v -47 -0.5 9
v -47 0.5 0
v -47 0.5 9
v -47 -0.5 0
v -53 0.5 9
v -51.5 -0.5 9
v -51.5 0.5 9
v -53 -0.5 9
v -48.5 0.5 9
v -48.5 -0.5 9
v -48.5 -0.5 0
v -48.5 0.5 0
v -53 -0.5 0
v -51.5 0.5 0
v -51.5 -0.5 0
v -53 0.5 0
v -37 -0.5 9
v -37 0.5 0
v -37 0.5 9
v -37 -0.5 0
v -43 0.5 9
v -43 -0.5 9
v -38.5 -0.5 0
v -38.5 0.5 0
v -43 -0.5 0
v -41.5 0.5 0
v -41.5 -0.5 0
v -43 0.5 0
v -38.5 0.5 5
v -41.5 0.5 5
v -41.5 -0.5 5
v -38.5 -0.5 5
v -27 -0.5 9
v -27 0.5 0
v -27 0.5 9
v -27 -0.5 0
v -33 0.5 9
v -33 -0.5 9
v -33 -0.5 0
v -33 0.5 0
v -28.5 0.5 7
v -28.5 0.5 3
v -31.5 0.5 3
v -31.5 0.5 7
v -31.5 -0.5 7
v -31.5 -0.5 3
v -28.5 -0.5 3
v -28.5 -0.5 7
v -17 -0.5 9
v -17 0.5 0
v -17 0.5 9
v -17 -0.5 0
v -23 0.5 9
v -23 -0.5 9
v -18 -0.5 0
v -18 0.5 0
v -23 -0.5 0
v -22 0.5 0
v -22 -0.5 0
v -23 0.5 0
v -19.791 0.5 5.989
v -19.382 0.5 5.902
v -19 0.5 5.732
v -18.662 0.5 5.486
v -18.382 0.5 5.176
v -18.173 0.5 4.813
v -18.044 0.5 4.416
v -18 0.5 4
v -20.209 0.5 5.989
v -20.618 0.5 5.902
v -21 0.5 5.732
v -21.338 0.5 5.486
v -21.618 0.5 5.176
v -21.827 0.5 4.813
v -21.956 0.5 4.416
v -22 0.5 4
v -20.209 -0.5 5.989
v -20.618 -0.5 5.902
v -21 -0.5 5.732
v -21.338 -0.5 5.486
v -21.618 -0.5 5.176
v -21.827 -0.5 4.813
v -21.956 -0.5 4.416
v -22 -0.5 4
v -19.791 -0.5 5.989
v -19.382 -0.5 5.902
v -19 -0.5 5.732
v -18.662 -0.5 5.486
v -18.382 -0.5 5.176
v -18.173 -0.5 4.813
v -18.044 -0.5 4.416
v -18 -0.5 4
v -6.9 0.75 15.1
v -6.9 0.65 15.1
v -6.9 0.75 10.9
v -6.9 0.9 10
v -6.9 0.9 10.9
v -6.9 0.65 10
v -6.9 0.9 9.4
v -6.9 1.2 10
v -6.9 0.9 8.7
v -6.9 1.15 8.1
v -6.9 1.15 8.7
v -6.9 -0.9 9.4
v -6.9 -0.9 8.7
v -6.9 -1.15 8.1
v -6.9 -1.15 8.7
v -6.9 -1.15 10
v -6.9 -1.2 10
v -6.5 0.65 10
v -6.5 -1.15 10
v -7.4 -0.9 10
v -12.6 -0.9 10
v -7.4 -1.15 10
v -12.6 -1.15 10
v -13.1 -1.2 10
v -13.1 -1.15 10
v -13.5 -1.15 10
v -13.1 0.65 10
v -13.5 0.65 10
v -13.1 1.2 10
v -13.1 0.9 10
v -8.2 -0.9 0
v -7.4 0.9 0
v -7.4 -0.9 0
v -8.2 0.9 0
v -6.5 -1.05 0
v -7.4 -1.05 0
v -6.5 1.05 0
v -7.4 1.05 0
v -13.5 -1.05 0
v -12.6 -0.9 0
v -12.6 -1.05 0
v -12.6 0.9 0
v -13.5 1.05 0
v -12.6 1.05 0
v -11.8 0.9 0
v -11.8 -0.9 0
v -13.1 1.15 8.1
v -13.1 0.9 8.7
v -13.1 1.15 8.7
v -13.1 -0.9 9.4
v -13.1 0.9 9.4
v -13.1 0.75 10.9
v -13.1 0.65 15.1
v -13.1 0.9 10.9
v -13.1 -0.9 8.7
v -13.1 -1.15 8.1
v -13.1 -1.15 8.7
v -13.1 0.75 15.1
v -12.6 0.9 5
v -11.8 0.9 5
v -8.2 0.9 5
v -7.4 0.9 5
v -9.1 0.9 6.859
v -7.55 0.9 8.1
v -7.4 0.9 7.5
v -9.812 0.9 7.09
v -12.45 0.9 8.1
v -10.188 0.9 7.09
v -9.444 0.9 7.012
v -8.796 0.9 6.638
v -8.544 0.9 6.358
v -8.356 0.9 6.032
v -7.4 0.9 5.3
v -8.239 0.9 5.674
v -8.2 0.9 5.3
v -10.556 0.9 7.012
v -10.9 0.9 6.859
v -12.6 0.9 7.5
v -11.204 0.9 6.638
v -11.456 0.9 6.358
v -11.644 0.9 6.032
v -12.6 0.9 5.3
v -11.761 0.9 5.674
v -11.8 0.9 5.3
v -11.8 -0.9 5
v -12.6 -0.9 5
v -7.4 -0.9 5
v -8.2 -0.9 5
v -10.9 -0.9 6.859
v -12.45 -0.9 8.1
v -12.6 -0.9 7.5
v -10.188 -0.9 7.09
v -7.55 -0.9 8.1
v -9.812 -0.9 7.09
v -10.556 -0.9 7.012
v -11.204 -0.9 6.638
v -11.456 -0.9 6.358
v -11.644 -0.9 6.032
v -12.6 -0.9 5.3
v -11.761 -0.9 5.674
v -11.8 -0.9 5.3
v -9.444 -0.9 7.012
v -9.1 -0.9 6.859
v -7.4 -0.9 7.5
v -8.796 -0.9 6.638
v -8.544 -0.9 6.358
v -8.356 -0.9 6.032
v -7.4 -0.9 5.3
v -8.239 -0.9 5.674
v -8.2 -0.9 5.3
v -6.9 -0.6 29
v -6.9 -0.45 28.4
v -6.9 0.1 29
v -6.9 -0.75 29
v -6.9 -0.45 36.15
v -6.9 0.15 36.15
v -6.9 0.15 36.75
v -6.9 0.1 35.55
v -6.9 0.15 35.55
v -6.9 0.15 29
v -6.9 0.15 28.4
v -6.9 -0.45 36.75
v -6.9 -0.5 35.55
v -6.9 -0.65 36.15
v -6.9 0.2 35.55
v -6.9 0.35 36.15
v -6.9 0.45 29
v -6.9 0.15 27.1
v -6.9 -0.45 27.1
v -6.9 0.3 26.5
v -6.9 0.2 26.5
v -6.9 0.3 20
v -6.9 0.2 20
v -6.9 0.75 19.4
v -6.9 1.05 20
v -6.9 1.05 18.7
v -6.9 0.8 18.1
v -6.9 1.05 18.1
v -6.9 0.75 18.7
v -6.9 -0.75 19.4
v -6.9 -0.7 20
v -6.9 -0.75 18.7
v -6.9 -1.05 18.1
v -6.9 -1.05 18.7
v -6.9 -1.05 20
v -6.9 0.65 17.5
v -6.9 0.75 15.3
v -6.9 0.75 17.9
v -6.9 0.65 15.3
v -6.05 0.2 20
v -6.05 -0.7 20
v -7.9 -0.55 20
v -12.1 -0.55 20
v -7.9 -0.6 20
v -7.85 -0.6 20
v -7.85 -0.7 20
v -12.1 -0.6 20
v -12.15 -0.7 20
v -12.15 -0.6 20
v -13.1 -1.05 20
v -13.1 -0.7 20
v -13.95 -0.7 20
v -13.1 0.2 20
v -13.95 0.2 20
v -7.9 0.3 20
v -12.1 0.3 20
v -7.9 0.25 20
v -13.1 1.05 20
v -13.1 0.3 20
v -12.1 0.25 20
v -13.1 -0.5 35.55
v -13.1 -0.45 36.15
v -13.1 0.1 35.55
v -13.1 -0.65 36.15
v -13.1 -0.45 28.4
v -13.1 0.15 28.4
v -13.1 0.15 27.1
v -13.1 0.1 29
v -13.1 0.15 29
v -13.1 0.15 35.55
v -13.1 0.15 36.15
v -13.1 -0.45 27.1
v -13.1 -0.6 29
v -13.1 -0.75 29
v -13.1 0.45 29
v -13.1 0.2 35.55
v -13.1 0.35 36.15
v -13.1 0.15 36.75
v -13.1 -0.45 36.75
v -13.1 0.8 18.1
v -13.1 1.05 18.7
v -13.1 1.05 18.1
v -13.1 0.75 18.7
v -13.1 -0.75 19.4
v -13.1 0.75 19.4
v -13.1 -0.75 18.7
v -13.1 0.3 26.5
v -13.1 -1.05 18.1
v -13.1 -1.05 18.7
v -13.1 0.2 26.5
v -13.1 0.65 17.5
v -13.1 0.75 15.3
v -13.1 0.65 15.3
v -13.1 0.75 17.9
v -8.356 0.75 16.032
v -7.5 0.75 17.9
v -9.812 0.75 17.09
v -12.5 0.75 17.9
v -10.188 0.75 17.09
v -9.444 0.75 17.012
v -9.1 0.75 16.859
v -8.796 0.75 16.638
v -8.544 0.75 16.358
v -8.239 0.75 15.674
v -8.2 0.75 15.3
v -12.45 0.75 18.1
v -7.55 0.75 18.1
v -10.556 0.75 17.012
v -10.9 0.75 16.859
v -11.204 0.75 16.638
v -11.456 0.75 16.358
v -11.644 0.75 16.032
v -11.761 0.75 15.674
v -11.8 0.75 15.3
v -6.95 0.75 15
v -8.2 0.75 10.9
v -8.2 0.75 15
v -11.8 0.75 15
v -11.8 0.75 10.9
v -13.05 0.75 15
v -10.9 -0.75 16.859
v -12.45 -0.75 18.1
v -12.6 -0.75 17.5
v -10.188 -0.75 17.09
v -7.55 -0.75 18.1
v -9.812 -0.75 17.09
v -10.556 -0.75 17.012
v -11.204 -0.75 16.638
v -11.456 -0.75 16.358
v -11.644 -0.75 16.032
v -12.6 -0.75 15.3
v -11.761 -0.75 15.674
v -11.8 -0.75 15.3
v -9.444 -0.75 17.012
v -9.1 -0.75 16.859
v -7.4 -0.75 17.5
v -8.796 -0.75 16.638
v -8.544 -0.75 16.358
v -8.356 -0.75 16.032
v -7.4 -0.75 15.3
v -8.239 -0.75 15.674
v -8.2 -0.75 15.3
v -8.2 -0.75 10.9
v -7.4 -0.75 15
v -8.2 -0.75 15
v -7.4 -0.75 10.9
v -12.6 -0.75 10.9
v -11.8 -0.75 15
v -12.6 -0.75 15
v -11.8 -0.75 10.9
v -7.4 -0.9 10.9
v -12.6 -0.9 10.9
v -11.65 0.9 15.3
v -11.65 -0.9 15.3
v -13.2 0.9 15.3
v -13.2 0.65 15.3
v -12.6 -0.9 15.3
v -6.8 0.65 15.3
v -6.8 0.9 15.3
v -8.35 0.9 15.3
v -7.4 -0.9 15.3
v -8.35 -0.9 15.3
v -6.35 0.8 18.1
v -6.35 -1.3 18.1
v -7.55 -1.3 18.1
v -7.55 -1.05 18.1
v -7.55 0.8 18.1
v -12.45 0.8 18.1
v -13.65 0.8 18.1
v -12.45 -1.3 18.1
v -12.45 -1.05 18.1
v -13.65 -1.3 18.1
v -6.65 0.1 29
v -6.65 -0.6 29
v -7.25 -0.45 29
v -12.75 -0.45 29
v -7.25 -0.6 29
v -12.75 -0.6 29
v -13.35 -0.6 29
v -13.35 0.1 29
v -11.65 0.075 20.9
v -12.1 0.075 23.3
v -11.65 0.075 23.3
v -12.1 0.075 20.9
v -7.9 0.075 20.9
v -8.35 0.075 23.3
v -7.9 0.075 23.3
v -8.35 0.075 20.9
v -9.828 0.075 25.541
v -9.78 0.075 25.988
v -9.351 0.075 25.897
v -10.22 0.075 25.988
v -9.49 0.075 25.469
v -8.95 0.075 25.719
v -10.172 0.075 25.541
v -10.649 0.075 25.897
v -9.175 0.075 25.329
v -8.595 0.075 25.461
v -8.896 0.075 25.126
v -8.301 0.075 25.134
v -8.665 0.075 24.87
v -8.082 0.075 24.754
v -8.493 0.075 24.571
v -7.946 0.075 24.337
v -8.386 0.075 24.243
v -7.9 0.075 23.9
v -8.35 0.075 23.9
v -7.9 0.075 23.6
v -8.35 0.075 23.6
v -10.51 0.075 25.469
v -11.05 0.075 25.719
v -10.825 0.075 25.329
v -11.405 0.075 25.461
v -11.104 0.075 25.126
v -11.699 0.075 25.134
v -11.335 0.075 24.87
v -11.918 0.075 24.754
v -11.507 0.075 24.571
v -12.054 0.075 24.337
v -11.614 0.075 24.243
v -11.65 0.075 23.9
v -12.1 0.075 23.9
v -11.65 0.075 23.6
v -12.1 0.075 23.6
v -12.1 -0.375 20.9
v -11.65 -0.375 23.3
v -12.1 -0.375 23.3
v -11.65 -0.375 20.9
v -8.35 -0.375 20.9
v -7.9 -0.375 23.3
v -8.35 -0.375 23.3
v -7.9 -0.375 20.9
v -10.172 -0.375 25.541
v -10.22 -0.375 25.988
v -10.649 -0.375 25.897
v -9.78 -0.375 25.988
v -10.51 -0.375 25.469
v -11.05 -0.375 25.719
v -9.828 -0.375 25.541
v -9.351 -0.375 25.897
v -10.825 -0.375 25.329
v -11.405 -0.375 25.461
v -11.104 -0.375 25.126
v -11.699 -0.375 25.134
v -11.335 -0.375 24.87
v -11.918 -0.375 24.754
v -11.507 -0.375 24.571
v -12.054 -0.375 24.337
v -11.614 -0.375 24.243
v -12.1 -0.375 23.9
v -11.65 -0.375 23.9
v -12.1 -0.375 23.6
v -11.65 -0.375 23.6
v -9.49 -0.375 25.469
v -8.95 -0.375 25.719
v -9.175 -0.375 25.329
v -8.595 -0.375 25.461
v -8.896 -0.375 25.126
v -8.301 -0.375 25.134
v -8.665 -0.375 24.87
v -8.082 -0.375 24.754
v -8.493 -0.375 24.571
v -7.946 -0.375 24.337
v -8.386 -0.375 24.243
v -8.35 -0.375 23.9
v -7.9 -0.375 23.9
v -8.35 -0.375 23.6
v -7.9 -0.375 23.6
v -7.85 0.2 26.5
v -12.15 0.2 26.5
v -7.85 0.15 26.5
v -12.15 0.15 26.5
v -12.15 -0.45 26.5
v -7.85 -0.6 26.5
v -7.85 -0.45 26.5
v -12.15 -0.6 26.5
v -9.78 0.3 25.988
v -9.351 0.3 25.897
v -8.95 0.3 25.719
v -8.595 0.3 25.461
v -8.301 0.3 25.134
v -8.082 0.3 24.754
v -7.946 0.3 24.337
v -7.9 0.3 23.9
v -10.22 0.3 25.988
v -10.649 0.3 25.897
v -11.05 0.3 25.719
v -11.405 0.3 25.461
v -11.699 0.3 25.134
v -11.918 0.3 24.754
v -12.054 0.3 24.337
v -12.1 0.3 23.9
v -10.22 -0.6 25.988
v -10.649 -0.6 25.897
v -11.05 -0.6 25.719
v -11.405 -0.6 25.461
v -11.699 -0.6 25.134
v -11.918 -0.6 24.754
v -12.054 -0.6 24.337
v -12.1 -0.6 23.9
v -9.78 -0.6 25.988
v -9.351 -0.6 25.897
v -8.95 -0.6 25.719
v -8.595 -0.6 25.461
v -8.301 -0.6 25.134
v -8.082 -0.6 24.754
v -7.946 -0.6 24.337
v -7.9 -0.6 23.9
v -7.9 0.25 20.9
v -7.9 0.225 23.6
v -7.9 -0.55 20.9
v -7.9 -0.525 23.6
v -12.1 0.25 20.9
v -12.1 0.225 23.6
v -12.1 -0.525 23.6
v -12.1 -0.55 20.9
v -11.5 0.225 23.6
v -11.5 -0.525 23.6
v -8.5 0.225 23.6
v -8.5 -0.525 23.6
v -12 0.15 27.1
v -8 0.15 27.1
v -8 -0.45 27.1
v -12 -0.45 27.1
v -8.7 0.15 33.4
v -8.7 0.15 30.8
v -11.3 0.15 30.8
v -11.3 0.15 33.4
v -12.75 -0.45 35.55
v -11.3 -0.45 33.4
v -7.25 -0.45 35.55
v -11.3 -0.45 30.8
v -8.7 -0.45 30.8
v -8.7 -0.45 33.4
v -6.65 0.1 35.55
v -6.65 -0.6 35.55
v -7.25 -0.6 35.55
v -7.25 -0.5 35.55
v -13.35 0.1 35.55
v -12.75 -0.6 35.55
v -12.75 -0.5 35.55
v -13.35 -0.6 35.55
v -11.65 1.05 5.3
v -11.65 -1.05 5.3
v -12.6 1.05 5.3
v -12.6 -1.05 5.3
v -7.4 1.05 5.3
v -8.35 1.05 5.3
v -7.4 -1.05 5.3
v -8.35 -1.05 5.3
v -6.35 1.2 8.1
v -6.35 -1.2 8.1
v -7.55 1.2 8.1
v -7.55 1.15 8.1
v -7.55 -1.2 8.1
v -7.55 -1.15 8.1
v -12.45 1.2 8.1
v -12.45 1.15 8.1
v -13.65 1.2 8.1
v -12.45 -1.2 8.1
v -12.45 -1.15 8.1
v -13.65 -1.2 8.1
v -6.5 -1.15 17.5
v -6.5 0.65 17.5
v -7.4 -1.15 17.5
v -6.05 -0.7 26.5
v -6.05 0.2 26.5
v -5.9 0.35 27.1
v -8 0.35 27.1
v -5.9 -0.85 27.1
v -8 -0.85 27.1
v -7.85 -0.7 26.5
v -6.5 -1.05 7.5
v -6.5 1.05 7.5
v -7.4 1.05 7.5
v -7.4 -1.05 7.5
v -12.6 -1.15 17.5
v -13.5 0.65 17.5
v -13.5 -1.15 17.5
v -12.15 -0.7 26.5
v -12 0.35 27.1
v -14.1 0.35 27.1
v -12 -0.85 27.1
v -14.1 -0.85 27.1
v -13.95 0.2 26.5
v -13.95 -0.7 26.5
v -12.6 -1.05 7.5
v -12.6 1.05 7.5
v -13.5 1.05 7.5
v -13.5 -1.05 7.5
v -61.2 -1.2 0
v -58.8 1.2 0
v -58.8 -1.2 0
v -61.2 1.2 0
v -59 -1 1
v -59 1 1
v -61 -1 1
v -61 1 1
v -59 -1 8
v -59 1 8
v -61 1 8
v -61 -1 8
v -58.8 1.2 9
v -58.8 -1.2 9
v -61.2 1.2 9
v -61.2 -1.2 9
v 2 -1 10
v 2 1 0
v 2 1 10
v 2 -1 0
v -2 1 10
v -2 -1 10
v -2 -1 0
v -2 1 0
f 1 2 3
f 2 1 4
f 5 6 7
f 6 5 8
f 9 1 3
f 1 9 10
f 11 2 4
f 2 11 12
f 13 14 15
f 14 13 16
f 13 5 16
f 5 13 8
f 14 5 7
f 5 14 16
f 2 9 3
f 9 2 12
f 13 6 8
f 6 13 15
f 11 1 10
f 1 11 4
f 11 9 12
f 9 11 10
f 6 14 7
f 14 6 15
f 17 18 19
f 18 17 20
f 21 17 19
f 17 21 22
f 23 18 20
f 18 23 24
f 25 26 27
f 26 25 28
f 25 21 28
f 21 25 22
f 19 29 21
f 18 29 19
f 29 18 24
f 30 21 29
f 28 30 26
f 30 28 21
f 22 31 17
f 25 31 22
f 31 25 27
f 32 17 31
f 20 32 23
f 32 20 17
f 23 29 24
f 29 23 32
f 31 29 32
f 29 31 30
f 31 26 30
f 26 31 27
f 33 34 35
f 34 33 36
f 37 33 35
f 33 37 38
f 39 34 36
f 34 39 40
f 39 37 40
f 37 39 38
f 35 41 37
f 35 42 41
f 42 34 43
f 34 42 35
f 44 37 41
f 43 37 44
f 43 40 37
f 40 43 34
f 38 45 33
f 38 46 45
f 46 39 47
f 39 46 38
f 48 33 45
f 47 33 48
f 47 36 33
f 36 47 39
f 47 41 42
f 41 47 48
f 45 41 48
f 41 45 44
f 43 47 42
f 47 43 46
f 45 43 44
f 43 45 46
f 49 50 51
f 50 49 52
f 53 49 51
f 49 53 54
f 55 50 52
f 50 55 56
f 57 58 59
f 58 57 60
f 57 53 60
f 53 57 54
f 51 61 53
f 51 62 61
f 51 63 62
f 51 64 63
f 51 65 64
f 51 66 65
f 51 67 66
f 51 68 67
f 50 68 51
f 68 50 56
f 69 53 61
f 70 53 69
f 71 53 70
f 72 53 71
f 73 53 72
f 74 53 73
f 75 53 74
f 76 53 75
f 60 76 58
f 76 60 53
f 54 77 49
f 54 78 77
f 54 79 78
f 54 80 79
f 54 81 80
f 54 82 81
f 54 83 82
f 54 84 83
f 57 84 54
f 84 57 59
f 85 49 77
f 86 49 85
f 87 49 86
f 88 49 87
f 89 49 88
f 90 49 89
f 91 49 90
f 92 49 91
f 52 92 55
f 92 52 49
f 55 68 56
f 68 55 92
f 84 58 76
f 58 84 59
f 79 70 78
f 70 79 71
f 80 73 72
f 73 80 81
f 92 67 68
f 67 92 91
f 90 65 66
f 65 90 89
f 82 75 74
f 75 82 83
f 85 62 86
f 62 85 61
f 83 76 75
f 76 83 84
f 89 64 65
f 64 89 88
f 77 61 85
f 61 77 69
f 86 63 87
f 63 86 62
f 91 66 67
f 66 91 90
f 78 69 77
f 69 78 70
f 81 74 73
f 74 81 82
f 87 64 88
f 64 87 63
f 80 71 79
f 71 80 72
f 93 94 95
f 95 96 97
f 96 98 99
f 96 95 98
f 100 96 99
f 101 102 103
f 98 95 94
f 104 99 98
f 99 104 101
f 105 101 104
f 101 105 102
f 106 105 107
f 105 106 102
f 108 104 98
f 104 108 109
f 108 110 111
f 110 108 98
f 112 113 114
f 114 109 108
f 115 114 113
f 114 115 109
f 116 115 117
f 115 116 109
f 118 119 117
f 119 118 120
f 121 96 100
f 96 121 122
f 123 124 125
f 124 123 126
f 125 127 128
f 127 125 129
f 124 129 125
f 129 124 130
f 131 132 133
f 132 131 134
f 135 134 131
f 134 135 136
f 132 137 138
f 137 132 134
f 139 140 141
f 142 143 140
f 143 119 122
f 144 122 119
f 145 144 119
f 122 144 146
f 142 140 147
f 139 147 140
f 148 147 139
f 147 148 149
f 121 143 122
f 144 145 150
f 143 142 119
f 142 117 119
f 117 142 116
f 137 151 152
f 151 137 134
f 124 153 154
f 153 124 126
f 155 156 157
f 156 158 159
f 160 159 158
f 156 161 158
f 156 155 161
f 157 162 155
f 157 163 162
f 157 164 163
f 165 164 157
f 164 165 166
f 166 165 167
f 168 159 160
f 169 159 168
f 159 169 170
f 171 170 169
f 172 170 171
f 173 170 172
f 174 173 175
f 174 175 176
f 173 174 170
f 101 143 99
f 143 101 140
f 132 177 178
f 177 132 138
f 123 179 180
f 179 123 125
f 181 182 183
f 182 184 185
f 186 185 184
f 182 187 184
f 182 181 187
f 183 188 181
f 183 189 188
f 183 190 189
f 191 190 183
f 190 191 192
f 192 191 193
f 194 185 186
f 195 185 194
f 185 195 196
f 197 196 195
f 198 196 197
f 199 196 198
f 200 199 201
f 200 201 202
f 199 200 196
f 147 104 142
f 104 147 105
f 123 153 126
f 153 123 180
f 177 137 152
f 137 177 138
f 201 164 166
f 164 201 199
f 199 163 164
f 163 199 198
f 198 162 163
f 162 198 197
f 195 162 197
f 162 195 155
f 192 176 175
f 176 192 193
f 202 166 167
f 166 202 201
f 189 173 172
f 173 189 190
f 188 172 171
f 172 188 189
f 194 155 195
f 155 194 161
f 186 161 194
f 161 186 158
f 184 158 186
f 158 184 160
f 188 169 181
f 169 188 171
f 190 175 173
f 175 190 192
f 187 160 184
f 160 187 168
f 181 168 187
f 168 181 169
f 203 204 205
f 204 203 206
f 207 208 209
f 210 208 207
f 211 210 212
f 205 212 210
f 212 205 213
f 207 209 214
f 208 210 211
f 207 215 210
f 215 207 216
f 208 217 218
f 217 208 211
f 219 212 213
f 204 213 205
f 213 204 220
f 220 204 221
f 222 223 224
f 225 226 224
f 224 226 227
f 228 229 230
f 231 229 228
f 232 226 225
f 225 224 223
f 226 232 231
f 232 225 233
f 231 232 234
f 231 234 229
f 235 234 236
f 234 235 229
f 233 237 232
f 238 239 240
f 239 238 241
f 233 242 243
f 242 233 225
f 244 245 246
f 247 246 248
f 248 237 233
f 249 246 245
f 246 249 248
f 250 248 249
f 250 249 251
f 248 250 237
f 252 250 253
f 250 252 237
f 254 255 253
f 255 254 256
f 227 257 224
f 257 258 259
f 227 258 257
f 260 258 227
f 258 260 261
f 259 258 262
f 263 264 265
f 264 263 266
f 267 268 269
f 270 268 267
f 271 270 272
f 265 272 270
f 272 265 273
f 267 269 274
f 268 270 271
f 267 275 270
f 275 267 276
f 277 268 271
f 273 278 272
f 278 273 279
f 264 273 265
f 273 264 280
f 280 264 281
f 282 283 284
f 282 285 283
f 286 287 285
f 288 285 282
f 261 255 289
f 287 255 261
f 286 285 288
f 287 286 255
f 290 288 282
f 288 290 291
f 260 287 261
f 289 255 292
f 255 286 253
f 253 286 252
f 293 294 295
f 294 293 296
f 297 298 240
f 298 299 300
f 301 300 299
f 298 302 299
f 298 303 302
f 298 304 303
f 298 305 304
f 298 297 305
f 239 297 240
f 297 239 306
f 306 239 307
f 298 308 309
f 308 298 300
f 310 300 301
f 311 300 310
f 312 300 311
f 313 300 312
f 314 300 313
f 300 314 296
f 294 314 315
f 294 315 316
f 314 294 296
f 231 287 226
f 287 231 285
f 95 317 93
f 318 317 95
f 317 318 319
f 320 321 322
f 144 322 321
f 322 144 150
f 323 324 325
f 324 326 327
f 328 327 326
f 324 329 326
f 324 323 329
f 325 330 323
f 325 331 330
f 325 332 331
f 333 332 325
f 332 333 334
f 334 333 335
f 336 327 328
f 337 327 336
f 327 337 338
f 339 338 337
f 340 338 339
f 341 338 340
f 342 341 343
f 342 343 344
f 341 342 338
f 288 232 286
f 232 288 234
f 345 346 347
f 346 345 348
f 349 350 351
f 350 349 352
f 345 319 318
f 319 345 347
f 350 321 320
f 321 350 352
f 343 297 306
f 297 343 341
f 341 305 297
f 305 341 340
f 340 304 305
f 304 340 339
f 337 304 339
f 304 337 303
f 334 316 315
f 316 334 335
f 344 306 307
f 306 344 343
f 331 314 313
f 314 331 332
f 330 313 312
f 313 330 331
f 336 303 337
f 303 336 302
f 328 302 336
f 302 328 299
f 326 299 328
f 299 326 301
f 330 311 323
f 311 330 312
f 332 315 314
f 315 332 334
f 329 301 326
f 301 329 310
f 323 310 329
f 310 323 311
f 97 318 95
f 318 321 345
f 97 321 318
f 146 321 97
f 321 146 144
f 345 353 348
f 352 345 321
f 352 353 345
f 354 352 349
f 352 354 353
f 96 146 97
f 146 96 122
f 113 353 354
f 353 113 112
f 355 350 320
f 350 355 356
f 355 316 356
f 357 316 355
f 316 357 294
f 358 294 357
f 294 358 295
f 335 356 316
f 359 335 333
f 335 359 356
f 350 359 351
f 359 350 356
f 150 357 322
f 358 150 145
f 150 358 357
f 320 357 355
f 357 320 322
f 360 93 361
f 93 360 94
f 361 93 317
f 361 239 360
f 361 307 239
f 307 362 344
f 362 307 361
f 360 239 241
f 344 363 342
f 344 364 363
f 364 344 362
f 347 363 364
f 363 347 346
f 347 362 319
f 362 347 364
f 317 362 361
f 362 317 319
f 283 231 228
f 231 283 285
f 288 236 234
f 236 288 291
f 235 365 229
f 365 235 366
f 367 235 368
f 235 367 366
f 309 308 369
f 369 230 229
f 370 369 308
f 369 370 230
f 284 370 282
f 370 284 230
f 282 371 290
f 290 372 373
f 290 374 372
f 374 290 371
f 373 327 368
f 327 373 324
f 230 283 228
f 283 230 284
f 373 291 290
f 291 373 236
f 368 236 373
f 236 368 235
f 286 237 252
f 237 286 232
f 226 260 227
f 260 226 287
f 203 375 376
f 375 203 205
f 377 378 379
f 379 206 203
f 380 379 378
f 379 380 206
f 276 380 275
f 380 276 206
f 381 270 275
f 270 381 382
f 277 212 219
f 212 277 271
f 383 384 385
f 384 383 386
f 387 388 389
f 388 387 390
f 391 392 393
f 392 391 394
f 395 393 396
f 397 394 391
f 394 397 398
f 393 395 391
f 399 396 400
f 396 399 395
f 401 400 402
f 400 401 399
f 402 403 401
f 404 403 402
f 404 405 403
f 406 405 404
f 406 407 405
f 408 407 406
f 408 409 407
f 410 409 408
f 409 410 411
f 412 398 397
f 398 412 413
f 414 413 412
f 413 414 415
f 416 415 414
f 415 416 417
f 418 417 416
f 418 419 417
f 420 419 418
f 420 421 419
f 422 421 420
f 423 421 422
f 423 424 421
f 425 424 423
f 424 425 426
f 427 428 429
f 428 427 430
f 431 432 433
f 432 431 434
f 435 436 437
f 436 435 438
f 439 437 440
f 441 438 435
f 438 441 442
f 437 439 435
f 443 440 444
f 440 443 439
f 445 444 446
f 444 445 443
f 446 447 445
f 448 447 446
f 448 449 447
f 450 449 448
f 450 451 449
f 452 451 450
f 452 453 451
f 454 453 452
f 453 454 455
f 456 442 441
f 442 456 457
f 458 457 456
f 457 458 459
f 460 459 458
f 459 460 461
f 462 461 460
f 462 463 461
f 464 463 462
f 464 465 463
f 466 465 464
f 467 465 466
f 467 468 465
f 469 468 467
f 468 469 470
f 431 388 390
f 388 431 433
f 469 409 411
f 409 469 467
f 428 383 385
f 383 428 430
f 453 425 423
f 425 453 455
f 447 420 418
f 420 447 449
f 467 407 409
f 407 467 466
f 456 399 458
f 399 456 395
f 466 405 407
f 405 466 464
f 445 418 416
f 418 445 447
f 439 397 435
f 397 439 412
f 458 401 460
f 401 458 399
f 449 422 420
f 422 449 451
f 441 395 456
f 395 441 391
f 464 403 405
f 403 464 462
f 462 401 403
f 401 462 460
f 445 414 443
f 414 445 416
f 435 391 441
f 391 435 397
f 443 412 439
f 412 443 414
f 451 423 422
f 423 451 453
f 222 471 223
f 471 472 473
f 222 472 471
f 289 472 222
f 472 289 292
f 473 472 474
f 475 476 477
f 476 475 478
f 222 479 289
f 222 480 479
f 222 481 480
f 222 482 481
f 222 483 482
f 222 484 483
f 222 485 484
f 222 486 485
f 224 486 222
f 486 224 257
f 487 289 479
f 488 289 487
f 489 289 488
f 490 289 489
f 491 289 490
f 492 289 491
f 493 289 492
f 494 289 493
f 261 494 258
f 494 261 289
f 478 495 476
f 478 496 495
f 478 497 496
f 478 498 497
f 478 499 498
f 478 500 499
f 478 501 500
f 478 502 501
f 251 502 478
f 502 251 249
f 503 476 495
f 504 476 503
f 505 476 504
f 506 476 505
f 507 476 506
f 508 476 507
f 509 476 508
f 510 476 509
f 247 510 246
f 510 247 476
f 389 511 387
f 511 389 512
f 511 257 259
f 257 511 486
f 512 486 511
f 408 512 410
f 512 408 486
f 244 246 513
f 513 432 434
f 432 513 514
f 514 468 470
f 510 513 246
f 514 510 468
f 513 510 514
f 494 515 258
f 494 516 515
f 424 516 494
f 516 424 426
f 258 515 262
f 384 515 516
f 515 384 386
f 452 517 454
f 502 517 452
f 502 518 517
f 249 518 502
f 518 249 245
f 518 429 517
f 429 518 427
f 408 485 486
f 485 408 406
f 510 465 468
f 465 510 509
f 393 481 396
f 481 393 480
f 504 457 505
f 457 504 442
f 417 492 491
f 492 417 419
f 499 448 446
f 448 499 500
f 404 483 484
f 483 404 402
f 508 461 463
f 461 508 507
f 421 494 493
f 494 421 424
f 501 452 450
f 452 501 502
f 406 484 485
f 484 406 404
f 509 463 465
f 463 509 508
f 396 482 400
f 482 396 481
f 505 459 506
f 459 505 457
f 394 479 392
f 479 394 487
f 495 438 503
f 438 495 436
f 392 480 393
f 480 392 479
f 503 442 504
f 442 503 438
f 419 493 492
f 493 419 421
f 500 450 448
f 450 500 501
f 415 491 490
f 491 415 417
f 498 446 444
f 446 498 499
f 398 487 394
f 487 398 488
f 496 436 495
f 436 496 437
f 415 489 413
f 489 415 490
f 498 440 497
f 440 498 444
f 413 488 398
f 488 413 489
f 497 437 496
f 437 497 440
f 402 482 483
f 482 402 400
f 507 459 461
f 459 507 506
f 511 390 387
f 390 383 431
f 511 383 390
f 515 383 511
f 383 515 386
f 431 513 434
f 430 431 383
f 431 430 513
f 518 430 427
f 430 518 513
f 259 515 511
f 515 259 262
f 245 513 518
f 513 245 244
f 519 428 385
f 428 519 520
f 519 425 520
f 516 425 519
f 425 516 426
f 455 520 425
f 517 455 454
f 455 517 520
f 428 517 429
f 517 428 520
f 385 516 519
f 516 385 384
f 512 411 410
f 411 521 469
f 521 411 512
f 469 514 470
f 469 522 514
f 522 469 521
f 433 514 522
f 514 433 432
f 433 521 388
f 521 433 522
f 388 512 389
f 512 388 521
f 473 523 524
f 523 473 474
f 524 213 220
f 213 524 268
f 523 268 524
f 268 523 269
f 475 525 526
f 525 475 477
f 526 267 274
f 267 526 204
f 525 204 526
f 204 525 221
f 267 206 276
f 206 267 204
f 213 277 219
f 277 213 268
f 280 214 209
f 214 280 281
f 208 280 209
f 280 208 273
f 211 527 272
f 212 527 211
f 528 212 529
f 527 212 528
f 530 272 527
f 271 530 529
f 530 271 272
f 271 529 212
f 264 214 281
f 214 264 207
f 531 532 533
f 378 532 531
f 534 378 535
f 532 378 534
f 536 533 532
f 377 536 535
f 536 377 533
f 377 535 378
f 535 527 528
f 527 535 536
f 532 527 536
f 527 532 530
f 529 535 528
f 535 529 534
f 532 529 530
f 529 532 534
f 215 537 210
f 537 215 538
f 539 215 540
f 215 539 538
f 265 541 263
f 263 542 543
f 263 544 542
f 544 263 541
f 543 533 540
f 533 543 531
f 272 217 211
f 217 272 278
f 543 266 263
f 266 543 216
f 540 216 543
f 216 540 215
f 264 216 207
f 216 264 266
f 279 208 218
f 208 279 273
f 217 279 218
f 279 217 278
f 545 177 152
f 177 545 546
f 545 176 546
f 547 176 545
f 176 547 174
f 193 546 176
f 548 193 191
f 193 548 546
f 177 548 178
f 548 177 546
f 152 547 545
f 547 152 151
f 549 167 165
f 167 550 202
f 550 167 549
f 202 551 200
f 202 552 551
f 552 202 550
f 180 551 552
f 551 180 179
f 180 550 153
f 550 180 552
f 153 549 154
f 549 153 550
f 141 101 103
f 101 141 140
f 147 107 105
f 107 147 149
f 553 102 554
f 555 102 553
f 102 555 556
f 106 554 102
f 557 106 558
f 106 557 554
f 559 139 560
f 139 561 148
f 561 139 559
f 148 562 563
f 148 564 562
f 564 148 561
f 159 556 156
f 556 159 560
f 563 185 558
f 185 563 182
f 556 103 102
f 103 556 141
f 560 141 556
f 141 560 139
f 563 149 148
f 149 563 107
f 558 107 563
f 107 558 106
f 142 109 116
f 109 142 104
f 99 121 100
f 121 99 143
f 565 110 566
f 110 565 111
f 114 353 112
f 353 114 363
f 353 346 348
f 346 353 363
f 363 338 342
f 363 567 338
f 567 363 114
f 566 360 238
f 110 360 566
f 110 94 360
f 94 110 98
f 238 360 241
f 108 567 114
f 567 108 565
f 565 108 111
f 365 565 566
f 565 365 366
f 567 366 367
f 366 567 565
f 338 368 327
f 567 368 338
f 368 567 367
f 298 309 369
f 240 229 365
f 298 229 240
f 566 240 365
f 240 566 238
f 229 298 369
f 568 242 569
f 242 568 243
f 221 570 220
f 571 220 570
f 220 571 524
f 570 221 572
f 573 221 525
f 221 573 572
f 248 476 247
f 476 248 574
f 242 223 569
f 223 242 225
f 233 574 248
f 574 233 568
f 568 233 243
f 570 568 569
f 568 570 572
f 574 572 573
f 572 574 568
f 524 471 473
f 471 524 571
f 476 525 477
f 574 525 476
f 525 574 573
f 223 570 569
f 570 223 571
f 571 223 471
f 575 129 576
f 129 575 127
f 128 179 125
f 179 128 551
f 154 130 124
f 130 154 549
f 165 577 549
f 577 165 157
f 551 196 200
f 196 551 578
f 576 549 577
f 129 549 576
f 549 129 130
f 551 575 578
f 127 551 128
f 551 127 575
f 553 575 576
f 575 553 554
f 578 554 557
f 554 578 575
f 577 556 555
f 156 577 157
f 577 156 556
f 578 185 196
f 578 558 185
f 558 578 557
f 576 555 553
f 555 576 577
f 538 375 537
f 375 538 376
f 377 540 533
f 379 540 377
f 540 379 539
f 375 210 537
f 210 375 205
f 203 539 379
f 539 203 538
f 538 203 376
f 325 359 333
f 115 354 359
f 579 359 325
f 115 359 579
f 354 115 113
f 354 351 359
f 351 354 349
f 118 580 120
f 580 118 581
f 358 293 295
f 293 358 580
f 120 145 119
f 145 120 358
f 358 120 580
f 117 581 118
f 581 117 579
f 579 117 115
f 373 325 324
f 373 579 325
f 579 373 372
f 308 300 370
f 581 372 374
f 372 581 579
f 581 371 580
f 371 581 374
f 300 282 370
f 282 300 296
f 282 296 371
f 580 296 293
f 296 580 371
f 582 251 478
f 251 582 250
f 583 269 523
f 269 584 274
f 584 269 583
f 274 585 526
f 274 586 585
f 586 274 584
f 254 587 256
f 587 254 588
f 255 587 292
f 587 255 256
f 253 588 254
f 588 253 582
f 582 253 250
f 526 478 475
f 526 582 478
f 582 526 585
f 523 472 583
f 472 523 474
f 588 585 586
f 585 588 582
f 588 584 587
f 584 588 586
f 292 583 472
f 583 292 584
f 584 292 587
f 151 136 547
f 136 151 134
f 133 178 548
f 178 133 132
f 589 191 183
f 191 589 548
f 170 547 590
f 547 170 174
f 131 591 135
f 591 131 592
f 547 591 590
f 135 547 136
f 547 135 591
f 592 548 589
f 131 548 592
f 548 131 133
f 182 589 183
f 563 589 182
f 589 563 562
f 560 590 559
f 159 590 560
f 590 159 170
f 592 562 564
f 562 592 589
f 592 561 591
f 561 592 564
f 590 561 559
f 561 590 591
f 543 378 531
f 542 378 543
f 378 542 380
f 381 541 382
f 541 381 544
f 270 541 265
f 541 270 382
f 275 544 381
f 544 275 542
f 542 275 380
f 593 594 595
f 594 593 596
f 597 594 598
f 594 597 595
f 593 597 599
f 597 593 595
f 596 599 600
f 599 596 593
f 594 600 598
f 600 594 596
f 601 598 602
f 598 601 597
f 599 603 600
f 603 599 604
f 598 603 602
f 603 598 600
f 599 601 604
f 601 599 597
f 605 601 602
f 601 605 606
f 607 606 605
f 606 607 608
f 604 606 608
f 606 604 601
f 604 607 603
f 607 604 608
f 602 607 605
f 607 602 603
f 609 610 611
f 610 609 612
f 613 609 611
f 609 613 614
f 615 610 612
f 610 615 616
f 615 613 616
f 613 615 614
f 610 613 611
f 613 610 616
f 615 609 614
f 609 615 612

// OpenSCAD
// ARENA DI VERONA - element library
//
// license : Creative Commons BY-NC-SA
//
// (C) Paolo Lombardi @ paladeen.net

// column example with trapezoid and wall
translate([-60,0,0]) color("Goldenrod") trapezoid([2.4,2.4,1],-0.2,-0.2);
translate([-60,0,1]) color("Moccasin")  wall([2,2,7]);
translate([-60,0,8]) color("Goldenrod") trapezoid([2,2,1],0.2,0.2);

// opening, door, window, arch examples
translate([-50,0,0]) opening([6,1,9],3);
translate([-40,0,0]) door([6,1,9],3,5);
translate([-30,0,0]) window([6,1,9],3,3,4);
translate([-20,0,0]) arch([6,1,9],4,6);

// full c6 element
translate([-10,0,0]) {
  c6arch();
  translate([3.05,0,0]) c6column();
  translate([-3.05,0,0]) c6column();
}

#wall([4,2,10]);

// C6 COLUMN
module c6column() {
  // ground floor
  translate([0,0,0])     color("Moccasin")  wall([0.9,2.1,8.1]);
  translate([0,0,7.5])   color("Goldenrod") trapezoid([0.9,2.1,0.6],0.15,0.15);
  // first floor
  translate([0,-0.25,10]) {
    translate([0,0,0])     color("Moccasin")  wall([0.9,1.8,8.1]);
    translate([0,0,7.5])   color("Goldenrod") trapezoid([0.9,1.8,0.6],0.15,0.15);
  }
  // second floor
  translate([0,-0.25,20]) {
    translate([0,0,0])     color("Moccasin")  wall([1.8,0.9,7.1]);
    translate([0,0,6.5])   color("Goldenrod") trapezoid([1.8,0.9,0.6],0.15,0.15);
  }
  // third floor
  translate([0,-0.25,29]) {
    translate([0,0,0])     color("Moccasin")  wall([0.6,0.7,6.55]);
  }
}

// C6 ARCH
module c6arch() {
  // ground floor
  translate([0,0,0])       arch([6.2,1.8,10],3.6,7.1);
  translate([-2.425,0,5])  color("Goldenrod") trapezoid([1.25,1.8,0.3],0.15,0.15);
  translate([2.425,0,5])   color("Goldenrod") trapezoid([1.25,1.8,0.3],0.15,0.15);
  translate([0,0,8.1])     color("Goldenrod") wall([6.2,2.3,0.6]);
  translate([0,0,9.4])     color("Goldenrod") trapezoid([6.2,1.8,0.6],0,0.3);
  // first floor
  translate([0,0,10]) {
    translate([0,0,0])       arch([6.2,1.5,10],3.6,7.1);
    translate([0,0,0])       wall([6.2,1.8,0.9]);
    translate([-2.425,0,5])  color("Goldenrod") trapezoid([1.25,1.5,0.3],0.15,0.15);
    translate([2.425,0,5])   color("Goldenrod") trapezoid([1.25,1.5,0.3],0.15,0.15);
    translate([0,0,8.1])     color("Goldenrod") wall([6.2,2.1,0.6]);
    translate([0,0,9.4])     color("Goldenrod") trapezoid([6.2,1.5,0.6],0,0.3);
  }
  // second floor
  translate([0,-0.15,20]) {
    translate([0,0,0])         arch([6.2,0.45,9],3.3,5.55);
    translate([0,0,0])         arch([6.2,0.9,6.5],4.2,6);
    translate([0,0,0])         wall([6.2,0.8,0.9]);
    translate([-2.275,0,3.3])  color("Goldenrod") trapezoid([1.25,0.45,0.3],0.15,0.15);
    translate([2.275,0,3.3])   color("Goldenrod") trapezoid([1.25,0.45,0.3],0.15,0.15);
    translate([0,0,6.5])       wall([6.2,0.6,1.9]);
    translate([0,0,8.4])       color("Goldenrod") trapezoid([6.2,0.6,0.6],0,0.3);
  }
  // third floor
  translate([0,-0.15,29]) {
    translate([0,0,0])     window([6.2,0.6,7.75],2.6,1.8,2.6);
    translate([0,0,6.55])  color("Goldenrod") trapezoid([6.2,0.7,0.6],0,0.15);
  }
}


// WALL (rectangular wall or column)
// ss : vector for envelope cube
module wall(ss) { 
  translate([-ss.x/2,-ss.y/2,0]) cube([ss.x,ss.y,ss.z]);
}

// TRAPEZOID (trapezoidal wall or column)
// ss : vector for envelope cube
// dx : displacement in X
// dx : displacement in Y
module trapezoid(ss,dx,dy) {
  points = [
    [-ss.x/2,-ss.y/2,0],[ss.x/2,-ss.y/2,0],[ss.x/2,ss.y/2,0],[-ss.x/2,ss.y/2,0],
    [-ss.x/2-dx,-ss.y/2-dy,ss.z],[ss.x/2+dx,-ss.y/2-dy,ss.z],
    [ss.x/2+dx,ss.y/2+dy,ss.z],[-ss.x/2-dx,ss.y/2+dy,ss.z]];
  faces = [
    [0,1,2,3],  // bottom
    [4,5,1,0],  // front
    [7,6,5,4],  // top
    [5,6,2,1],  // right
    [6,7,3,2],  // back
    [7,4,0,3]]; // left
  polyhedron(points,faces);
}

// WINDOW (wall with horizontally centered window)
// ss : vector for envelope cube
// oo : window width
// h1 : height of bottom of window
// h2 : height of top of window
module window(ss,oo,h1,h2) { 
  if (ss.x>ss.y) difference() {
    translate([-ss.x/2,-ss.y/2,0]) cube([ss.x,ss.y,ss.z]);
    translate([-oo/2,-(ss.y*1.1)/2,h1]) cube([oo,ss.y*1.1,h2]);
  }
  else difference() {
    translate([-ss.x/2,-ss.y/2,0]) cube([ss.x,ss.y,ss.z]);
    translate([-(ss.x*1.1)/2,-oo/2,h1]) cube([ss.x*1.1,oo,h2]);
  }
}


// DOOR (wall with horizontally centered rect opening)
// ss : vector for envelope cube
// oo : door width
// hh : height of door
module door(ss,oo,hh) {
  if (ss.x>ss.y) difference() {
    translate([-ss.x/2,-ss.y/2,0]) cube([ss.x,ss.y,ss.z]);
    translate([-oo/2,-(ss.y*1.1)/2,-hh*0.1]) cube([oo,ss.y*1.1,hh*1.1]);
  }
  else difference() {
    translate([-ss.x/2,-ss.y/2,0]) cube([ss.x,ss.y,ss.z]);
    translate([-(ss.x*1.1)/2,-oo/2,-hh*0.1]) cube([ss.x*1.1,oo,hh*1.1]);
  }
}


// OPENING (wall horizontally centered with void opening)
// ss : vector for envelope cube
// oo : opening width
module opening(ss,oo) {
  if (ss.x>ss.y) difference() {
    translate([-ss.x/2,-ss.y/2,0]) cube([ss.x,ss.y,ss.z]);
    translate([-oo/2,-(ss.y*1.1)/2,-(ss.z*0.1)/2]) cube([oo,ss.y*1.1,ss.z*1.1]);
  }
  else difference() {
    translate([-ss.x/2,-ss.y/2,0]) cube([ss.x,ss.y,ss.z]);
    translate([-(ss.x*1.1)/2,-oo/2,-(ss.z*0.1)/2]) cube([ss.x*1.1,oo,ss.z*1.1]);
  }
}

// ARCH (wall with arched opening)
// ss : vector for envelope cube
// oo : width of opening and arch diameter
// hh : height of opening including arch
module arch(ss,oo,hh) {
  ho = hh-oo/2;
  if (ss.x>ss.y) difference() {
    translate([-ss.x/2,-ss.y/2,0]) cube([ss.x,ss.y,ss.z]);
    translate([-oo/2,-(ss.y*1.1)/2,-ho*0.1]) cube([oo,ss.y*1.1,ho*1.1]);
    translate([0,-(ss.y*1.1)/2,ho]) rotate([-90,0,0]) cylinder(d=oo,h=ss.y*1.1,$fs=0.2);
  }
  else difference() {
    translate([-ss.x/2,-ss.y/2,0]) cube([ss.x,ss.y,ss.z]);
    translate([-(ss.x*1.1)/2,-oo/2,-ho*0.1]) cube([ss.x*1.1,oo,ho*1.1]);
    translate([-(ss.x*1.1)/2,0,ho]) rotate([0,90,0]) cylinder(d=oo,h=ss.x*1.1,$fs=0.2);
  }  
}
